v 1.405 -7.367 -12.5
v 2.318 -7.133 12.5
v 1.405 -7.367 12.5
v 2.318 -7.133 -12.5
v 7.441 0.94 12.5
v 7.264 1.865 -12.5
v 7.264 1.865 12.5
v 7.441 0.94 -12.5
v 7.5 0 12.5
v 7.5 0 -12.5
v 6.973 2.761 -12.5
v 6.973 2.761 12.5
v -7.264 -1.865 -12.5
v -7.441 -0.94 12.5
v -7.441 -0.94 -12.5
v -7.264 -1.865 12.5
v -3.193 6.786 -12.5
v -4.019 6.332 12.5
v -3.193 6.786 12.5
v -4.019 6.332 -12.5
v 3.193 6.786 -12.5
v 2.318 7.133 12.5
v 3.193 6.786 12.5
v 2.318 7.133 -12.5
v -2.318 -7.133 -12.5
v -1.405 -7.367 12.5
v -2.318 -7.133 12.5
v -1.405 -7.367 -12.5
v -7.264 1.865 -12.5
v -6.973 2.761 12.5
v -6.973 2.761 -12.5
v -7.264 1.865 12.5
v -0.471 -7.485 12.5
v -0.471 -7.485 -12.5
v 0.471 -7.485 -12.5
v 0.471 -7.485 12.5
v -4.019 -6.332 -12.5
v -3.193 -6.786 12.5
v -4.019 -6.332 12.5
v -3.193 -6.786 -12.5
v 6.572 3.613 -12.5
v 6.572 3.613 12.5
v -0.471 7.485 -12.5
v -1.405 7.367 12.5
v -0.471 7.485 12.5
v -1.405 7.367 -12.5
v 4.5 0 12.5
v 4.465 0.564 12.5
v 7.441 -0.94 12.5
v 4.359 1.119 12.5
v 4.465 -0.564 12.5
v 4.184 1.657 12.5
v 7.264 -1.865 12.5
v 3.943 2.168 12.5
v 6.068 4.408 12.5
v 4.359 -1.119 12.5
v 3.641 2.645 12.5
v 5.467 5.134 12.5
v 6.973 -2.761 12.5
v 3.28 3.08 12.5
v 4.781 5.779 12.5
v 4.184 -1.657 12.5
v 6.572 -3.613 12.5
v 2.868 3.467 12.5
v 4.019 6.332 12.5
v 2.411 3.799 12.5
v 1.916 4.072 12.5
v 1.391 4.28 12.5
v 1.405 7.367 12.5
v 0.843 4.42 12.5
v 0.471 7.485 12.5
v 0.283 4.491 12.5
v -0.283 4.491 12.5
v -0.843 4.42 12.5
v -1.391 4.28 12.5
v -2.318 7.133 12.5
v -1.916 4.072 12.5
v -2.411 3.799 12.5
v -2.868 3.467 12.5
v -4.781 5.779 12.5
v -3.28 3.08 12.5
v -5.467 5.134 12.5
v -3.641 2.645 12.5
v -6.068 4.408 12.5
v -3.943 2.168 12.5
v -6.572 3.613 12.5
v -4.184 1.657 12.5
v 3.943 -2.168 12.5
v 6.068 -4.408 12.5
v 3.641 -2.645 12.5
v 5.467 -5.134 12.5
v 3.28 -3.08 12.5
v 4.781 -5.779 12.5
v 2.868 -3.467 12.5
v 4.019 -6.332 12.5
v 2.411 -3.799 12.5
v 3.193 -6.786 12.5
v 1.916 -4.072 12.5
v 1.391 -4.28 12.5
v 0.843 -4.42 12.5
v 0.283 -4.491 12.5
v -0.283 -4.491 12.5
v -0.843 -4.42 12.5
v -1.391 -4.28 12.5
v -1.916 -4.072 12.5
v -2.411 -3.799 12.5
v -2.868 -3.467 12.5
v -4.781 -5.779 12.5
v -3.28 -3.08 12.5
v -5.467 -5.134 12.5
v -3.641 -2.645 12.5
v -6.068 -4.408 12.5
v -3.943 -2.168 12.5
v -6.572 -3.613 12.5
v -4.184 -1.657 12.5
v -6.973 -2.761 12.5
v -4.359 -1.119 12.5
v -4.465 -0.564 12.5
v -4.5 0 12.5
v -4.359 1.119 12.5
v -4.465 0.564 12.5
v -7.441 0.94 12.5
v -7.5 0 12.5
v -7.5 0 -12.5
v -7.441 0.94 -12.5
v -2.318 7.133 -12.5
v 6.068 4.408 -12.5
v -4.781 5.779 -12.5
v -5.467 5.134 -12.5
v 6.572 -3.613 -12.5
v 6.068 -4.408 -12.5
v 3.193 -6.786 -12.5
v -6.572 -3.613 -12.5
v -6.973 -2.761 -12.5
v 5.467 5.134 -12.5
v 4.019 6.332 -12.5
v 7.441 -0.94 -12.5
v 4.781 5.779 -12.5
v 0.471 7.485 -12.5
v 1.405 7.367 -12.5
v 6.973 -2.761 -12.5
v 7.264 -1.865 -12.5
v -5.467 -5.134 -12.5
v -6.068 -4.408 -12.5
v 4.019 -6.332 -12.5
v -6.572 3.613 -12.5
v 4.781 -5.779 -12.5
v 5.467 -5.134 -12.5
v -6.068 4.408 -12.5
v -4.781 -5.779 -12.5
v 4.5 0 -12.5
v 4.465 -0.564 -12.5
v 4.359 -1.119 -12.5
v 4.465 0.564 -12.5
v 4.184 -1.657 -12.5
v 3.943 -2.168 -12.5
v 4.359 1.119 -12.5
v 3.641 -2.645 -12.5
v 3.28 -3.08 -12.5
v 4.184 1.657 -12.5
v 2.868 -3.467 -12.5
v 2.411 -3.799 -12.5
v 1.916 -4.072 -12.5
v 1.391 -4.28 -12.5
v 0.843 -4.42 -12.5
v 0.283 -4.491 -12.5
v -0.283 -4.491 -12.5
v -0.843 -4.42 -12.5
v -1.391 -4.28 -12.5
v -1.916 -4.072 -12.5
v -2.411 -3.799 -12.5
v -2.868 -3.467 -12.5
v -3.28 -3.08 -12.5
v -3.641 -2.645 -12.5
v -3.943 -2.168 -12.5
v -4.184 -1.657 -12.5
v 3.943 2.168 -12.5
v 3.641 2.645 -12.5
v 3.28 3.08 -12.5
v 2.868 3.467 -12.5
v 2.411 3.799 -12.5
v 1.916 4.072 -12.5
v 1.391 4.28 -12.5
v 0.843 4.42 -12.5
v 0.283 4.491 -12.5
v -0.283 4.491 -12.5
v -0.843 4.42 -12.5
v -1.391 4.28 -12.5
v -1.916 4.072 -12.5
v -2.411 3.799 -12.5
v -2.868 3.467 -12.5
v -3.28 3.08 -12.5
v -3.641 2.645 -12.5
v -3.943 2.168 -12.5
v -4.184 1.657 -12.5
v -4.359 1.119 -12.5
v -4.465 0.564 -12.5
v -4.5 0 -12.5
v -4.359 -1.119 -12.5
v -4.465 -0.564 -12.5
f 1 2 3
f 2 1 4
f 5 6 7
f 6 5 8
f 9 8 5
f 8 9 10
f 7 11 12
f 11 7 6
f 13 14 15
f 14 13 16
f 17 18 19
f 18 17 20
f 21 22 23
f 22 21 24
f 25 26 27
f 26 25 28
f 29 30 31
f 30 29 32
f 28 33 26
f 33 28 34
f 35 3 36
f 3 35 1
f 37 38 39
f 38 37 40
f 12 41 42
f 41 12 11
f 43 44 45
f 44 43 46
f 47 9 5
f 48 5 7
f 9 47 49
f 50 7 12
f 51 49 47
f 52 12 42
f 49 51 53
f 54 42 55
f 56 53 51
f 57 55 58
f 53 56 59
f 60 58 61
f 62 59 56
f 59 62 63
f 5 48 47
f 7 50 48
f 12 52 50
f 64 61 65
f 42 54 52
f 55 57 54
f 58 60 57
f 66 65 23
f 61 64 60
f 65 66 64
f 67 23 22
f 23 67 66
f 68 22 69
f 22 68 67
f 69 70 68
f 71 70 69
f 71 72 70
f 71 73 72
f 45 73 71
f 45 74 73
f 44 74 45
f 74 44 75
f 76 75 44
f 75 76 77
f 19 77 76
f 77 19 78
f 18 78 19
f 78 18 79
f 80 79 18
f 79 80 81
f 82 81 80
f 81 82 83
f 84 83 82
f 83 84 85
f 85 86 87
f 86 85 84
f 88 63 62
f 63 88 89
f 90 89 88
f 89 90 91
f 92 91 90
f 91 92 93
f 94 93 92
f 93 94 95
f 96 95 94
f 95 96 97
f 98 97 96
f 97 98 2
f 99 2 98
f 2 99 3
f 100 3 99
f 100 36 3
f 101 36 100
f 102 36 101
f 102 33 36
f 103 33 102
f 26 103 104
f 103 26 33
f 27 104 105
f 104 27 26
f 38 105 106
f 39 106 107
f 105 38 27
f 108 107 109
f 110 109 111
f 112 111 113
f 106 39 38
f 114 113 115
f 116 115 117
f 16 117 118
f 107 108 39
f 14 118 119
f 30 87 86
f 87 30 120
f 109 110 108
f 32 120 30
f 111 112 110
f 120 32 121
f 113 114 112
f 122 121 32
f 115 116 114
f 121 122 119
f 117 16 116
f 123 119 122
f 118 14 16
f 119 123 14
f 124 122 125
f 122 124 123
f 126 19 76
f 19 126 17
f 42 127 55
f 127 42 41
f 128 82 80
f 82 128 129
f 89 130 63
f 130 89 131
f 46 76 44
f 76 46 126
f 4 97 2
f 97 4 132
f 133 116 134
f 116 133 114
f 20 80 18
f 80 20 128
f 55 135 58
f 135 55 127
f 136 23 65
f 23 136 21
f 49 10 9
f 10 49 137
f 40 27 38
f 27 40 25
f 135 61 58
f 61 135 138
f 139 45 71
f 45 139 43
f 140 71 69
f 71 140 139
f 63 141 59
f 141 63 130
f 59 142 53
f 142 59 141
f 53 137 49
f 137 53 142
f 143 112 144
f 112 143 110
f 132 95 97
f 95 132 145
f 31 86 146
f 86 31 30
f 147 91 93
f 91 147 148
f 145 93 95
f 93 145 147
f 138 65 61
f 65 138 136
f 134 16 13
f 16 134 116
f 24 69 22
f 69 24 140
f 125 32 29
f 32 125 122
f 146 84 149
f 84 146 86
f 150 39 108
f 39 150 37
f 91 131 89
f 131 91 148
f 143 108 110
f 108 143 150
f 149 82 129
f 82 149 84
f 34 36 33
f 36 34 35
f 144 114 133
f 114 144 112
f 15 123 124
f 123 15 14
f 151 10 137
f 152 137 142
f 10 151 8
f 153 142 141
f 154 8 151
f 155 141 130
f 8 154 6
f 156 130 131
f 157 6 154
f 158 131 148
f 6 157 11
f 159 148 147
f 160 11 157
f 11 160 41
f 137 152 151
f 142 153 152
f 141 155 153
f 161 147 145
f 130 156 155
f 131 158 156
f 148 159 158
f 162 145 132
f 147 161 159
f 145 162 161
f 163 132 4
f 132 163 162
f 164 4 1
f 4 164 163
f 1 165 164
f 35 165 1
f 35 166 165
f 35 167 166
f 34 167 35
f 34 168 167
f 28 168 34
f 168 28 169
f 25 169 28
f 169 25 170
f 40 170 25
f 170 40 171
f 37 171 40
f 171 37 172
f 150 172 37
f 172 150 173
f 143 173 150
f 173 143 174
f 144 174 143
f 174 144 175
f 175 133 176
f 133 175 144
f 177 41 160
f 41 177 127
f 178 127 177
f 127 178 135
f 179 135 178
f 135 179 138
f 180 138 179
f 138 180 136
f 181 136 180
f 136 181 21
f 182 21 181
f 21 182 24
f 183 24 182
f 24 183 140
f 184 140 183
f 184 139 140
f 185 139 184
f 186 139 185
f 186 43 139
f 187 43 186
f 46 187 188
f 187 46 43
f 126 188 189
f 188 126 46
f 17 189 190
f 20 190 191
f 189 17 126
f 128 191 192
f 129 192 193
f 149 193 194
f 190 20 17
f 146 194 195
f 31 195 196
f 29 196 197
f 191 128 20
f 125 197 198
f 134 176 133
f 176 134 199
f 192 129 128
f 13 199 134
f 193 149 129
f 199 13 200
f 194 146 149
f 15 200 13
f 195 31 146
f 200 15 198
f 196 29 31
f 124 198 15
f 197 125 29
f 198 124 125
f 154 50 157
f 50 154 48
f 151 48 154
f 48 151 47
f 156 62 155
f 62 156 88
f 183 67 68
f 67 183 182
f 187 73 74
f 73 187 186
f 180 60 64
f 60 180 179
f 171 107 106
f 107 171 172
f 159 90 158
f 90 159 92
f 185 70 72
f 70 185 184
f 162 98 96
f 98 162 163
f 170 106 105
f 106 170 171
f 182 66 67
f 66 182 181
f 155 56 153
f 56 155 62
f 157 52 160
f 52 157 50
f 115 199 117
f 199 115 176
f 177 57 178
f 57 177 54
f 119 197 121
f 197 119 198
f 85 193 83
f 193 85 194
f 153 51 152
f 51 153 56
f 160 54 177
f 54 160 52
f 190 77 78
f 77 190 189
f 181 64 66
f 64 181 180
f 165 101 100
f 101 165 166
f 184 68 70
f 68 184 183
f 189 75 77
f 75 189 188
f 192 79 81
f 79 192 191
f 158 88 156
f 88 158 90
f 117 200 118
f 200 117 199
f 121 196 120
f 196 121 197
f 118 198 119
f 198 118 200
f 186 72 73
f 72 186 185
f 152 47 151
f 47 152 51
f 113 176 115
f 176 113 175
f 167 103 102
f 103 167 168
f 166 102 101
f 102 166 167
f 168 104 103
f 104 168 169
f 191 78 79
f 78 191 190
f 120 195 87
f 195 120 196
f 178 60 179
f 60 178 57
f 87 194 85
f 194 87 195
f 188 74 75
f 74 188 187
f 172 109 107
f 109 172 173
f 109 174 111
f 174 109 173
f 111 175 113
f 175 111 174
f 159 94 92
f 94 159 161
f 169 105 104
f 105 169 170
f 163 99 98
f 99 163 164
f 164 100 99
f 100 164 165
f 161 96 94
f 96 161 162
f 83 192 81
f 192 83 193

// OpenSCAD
$fn = 50;


difference() {
	union() {
		translate(v = [0, 0, -12.5000000000]) {
			cylinder(h = 25, r = 7.5000000000);
		}
	}
	union() {
		translate(v = [0, 0, -100.0000000000]) {
			cylinder(h = 200, r = 4.5000000000);
		}
	}
}
